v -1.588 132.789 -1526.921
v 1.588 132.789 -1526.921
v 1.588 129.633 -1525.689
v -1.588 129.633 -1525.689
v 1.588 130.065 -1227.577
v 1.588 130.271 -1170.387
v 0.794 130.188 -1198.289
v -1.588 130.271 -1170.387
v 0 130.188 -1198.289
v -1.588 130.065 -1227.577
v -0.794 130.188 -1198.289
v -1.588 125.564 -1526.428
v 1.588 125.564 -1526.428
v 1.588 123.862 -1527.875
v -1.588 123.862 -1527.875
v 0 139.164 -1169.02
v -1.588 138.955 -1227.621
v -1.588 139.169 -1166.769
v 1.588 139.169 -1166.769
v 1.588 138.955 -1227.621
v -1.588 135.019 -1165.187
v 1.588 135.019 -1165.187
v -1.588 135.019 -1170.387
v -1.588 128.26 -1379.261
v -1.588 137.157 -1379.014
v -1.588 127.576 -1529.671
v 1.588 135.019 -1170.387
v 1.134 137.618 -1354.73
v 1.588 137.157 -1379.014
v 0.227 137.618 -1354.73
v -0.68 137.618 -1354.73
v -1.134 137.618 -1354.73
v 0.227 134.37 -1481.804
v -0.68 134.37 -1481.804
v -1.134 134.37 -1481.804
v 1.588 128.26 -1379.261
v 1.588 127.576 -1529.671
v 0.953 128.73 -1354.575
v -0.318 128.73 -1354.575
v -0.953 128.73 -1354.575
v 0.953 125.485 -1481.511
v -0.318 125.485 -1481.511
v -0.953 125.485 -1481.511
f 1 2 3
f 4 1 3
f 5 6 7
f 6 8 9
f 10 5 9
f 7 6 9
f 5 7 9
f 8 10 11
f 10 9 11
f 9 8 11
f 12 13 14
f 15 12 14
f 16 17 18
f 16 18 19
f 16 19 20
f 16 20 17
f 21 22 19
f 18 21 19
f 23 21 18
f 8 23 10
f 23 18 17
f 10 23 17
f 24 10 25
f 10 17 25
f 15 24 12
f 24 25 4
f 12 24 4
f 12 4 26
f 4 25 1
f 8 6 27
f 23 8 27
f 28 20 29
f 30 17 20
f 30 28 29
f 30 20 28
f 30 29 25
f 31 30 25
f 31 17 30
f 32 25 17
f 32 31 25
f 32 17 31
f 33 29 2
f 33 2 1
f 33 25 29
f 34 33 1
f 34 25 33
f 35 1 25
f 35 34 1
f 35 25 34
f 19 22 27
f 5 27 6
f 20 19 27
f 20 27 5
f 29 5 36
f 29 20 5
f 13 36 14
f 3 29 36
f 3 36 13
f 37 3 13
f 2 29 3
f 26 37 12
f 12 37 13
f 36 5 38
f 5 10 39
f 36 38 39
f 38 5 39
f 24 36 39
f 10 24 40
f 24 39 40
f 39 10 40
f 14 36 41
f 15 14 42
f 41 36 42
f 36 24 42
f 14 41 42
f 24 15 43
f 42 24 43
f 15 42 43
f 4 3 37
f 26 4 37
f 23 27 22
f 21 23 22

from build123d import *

# Parameters (mm, degrees)
BOSS_EXTRUDE1_START = -1.5875
BOSS_EXTRUDE1_DEPTH = 3.175
FILLET1_R           = 2.54
CUT_EXTRUDE1_DEPTH  = 2674.191025632
FILLET2_R           = 0.762
FILLET3_R           = 0.762
CUT_EXTRUDE2_DEPTH  = 7.62


with BuildPart() as part:
    # Boss-Extrude1: read off the stored shape, not the designer's step
    # Boss-Extrude1 outline → Boss-Extrude1 (new body)
    with BuildSketch(Plane(origin=(0, 0, 0), x_dir=(0, 0, -1), z_dir=(1, 0, 0)).offset(BOSS_EXTRUDE1_START)):
        with BuildLine():
            add(Edge.make_bspline(
                [(1110.404970926, 130.384545774), (1120.170834465, 130.370061323), (1139.703057908, 130.338772026), (1168.998370974, 130.277673039), (1198.290610395, 130.194386876), (1217.81419633, 130.113940836), (1227.576506903, 130.06508052)],
                knots=[0, 0, 0, 0, 0.25, 0.5, 0.75, 1, 1, 1, 1], degree=3))
            add(Edge.make_bspline(
                [(1227.576506903, 130.06508052), (1269.911205773, 129.853195249), (1333.427746701, 129.273373321), (1418.042208161, 127.449050563), (1502.665994832, 124.913583682), (1608.454176987, 120.803299479), (1693.070073331, 116.848243245), (1735.369787733, 114.744712179)],
                knots=[0, 0, 0, 0, 0.25, 0.375, 0.5, 0.75, 1, 1, 1, 1], degree=3))
            add(Edge.make_bspline(
                [(1735.369787733, 114.744712179), (1815.995940723, 110.735232018), (1936.906650462, 104.096364548), (2098.049485168, 94.18797875), (2198.694736725, 87.314638509), (2279.130413747, 81.114418931), (2339.412950304, 76.034076608), (2399.564054334, 70.28270545), (2479.570468264, 61.127378254), (2559.292087872, 49.650907614), (2626.797554585, 38.235484735), (2656.889518578, 32.788503969), (2667.159793662, 30.877771266), (2669.54, 30.432069924)],
                knots=[0, 0, 0, 0, 0.25, 0.375, 0.5, 0.5625, 0.625, 0.6875, 0.75, 0.875, 0.9375, 0.96241067, 0.969928536, 0.969928536, 0.969928536, 0.969928536], degree=3))
            Line((2669.54, 30.432069924), (2669.54, 39.476142465))
            add(Edge.make_bspline(
                [(1735.811334709, 123.623740069), (1776.138635499, 121.618292624), (1816.460281579, 119.500621806), (1897.093668675, 115.087561885), (1937.405638896, 112.792971084), (2018.018419045, 108.018366523), (2058.319512223, 105.539122976), (2138.903780144, 100.307240032), (2179.18739793, 97.555127955), (2239.586998714, 93.080168687), (2259.716280977, 91.529837622), (2289.900442602, 89.09084343), (2299.960179135, 88.258845039), (2320.076004566, 86.552861654), (2330.132100898, 85.678962223), (2350.239356518, 83.874334847), (2360.290489794, 82.943307484), (2380.385973971, 81.003183297), (2390.430065378, 79.993418555), (2420.547026195, 76.827577532), (2440.60648589, 74.533672955), (2480.675569568, 69.556278523), (2500.68715183, 66.874150811), (2540.654290207, 61.150246295), (2560.611026428, 58.109755646), (2600.475457131, 51.702465574), (2620.382967089, 48.337538888), (2650.028116889, 43.072156367), (2659.78844051, 41.29687683), (2669.54, 39.476142465)],
                knots=[0, 0, 0, 0, 0.125, 0.125, 0.25, 0.25, 0.375, 0.375, 0.5, 0.5, 0.5625, 0.5625, 0.59375, 0.59375, 0.625, 0.625, 0.65625, 0.65625, 0.6875, 0.6875, 0.75, 0.75, 0.8125, 0.8125, 0.875, 0.875, 0.9375, 0.9375, 0.968210768, 0.968210768, 0.968210768, 0.968210768], degree=3))
            add(Edge.make_bspline(
                [(1227.621000751, 138.954969175), (1248.807303679, 138.848931677), (1269.993583155, 138.701170252), (1312.363832348, 138.270664618), (1333.547719008, 137.987407832), (1375.912368189, 137.249274813), (1397.09309738, 136.7925677), (1439.451328259, 135.701855835), (1460.629010312, 135.069210584), (1502.979101161, 133.670541385), (1524.152152736, 132.907434339), (1566.494303759, 131.284732459), (1587.663166024, 130.423163385), (1651.164052809, 127.709123983), (1693.490421561, 125.728325331), (1735.811334709, 123.623740069)],
                knots=[0, 0, 0, 0, 0.125, 0.125, 0.25, 0.25, 0.375, 0.375, 0.5, 0.5, 0.625, 0.625, 0.75, 0.75, 1, 1, 1, 1], degree=3))
            add(Edge.make_bspline(
                [(1110.418156307, 139.274535996), (1129.952027249, 139.245563914), (1149.485893504, 139.211997476), (1188.553558893, 139.115899087), (1208.087346834, 139.052735015), (1227.621000751, 138.954969175)],
                knots=[0, 0, 0, 0, 0.5, 0.5, 1, 1, 1, 1], degree=3))
            add(Edge.make_bspline(
                [(768.740124165, 138.468408213), (782.976796045, 138.460280143), (797.213453801, 138.479500079), (825.686695051, 138.549690296), (839.923258916, 138.600062665), (868.396318956, 138.719026333), (882.632808962, 138.789607972), (911.105746117, 138.939594729), (925.342197007, 139.018479563), (953.81517223, 139.160090703), (968.051699178, 139.222241505), (996.524919377, 139.30995407), (1010.761605517, 139.335014039), (1039.234912871, 139.349647552), (1053.471562869, 139.340493535), (1081.944860968, 139.313691902), (1096.181508981, 139.29565137), (1110.418156307, 139.274535996)],
                knots=[0, 0, 0, 0, 0.125, 0.125, 0.25, 0.25, 0.375, 0.375, 0.5, 0.5, 0.625, 0.625, 0.75, 0.75, 0.875, 0.875, 1, 1, 1, 1], degree=3))
            add(Edge.make_bspline(
                [(630.778432202, 139.251437536), (653.771819614, 139.075315664), (676.765000849, 138.871740519), (711.255349111, 138.647690701), (722.752238945, 138.586174182), (745.746099074, 138.499784896), (757.243084259, 138.474972158), (768.740124165, 138.468408213)],
                knots=[0, 0, 0, 0, 0.5, 0.5, 0.75, 0.75, 1, 1, 1, 1], degree=3))
            add(Edge.make_bspline(
                [(604.514984259, 139.433685568), (609.940743136, 139.400696354), (618.695242427, 139.342071397), (627.449694696, 139.276935028), (630.778432202, 139.251437536)],
                knots=[0, 0, 0, 0, 0.619765686, 1, 1, 1, 1], degree=3))
            ThreePointArc((604.514984259, 139.433685568), (600.549356142, 139.457173081), (596.583720644, 139.479379304))
            add(Edge.make_bspline(
                [(436.133018826, 139.357176562), (449.50393779, 139.390650739), (462.874888934, 139.412366015), (489.61665939, 139.498555977), (502.987497127, 139.559076553), (529.729299233, 139.628029754), (543.100240501, 139.639230481), (569.84212102, 139.601013959), (583.212960696, 139.552035302), (596.583720644, 139.479379304)],
                knots=[0, 0, 0, 0, 0.25, 0.25, 0.5, 0.5, 0.75, 0.75, 1, 1, 1, 1], degree=3))
            add(Edge.make_bspline(
                [(432.263917423, 139.347117104), (433.553617637, 139.350567112), (434.843318039, 139.353947814), (436.133018826, 139.357176562)],
                knots=[0, 0, 0, 0, 1, 1, 1, 1], degree=3))
            add(Edge.make_bspline(
                [(420.316232014, 139.305761868), (422.413235913, 139.315186344), (426.395793967, 139.330351666), (430.378363115, 139.342073082), (432.263917423, 139.347117104)],
                knots=[0, 0, 0, 0, 0.526548575, 1, 1, 1, 1], degree=3))
            add(Edge.make_bspline(
                [(376.410119779, 138.75403864), (383.726317086, 138.935561778), (391.043801196, 139.055611797), (405.679602634, 139.224192856), (412.997895507, 139.272871444), (420.316232014, 139.305761868)],
                knots=[0, 0, 0, 0, 0.5, 0.5, 1, 1, 1, 1], degree=3))
            add(Edge.make_bspline(
                [(336.49221538, 137.002990798), (349.782924989, 137.88646357), (363.094318653, 138.423658969), (376.410119779, 138.75403864)],
                knots=[0, 0, 0, 0, 1, 1, 1, 1], degree=3))
            add(Edge.make_bspline(
                [(322.369488076, 135.928469458), (327.073374868, 136.333386449), (331.781331813, 136.689844531), (336.49221538, 137.002990798)],
                knots=[0, 0, 0, 0, 1, 1, 1, 1], degree=3))
            add(Edge.make_bspline(
                [(269.769949315, 129.47895505), (274.123387467, 130.231879276), (278.485668028, 130.925946417), (287.22796256, 132.196043087), (291.608626646, 132.771988738), (300.381777496, 133.818422146), (304.774579419, 134.288963443), (313.567800313, 135.154375086), (317.967903853, 135.549407043), (322.369488076, 135.928469458)],
                knots=[0, 0, 0, 0, 0.25, 0.25, 0.5, 0.5, 0.75, 0.75, 1, 1, 1, 1], degree=3))
            add(Edge.make_bspline(
                [(135.15718457, 90.054634926), (146.043739673, 94.375230064), (156.99891695, 98.504335222), (173.56622243, 104.322560697), (179.110932848, 106.199810145), (190.24859245, 109.819698901), (195.841545849, 111.562316625), (207.065472514, 114.901345648), (212.697969124, 116.49836249), (224.005973618, 119.540534541), (229.683240596, 120.9862349), (246.767187276, 125.077694043), (258.225188059, 127.482295924), (269.769949315, 129.47895505)],
                knots=[0, 0, 0, 0, 0.25, 0.25, 0.375, 0.375, 0.5, 0.5, 0.625, 0.625, 0.75, 0.75, 1, 1, 1, 1], degree=3))
            add(Edge.make_bspline(
                [(107.049744533, 78.466050261), (116.373258882, 82.438606419), (125.737350123, 86.316143859), (135.15718457, 90.054634926)],
                knots=[0, 0, 0, 0, 1, 1, 1, 1], degree=3))
            add(Edge.make_bspline(
                [(99.06, 75.03568963), (99.223542669, 75.106424562), (100.635498802, 75.716852689), (103.297453866, 76.863328103), (105.798503999, 77.932922637), (107.049744533, 78.466050261)],
                knots=[0.484151133, 0.484151133, 0.484151133, 0.484151133, 0.515864471, 0.757931449, 1, 1, 1, 1], degree=3))
            Line((99.06, 75.03568963), (99.06, 65.345043949))
            add(Edge.make_bspline(
                [(99.06, 65.345043949), (99.380370965, 65.484464523), (100.637671455, 66.031176319), (103.17753745, 67.132002814), (106.681577323, 68.64166857), (109.249580285, 69.740028797), (110.534459652, 70.287489229)],
                knots=[0.254738807, 0.254738807, 0.254738807, 0.254738807, 0.317238807, 0.5, 0.75, 1, 1, 1, 1], degree=3))
            add(Edge.make_bspline(
                [(110.534459652, 70.287489229), (112.850658013, 71.274373329), (117.489277519, 73.236837099), (124.456688526, 76.138068453), (131.438476528, 78.994265342), (136.101204469, 80.864754132), (138.436571012, 81.791601309)],
                knots=[0, 0, 0, 0, 0.25, 0.5, 0.75, 1, 1, 1, 1], degree=3))
            add(Edge.make_bspline(
                [(138.436571012, 81.791601309), (143.826897197, 83.930883835), (154.6522834, 88.11877139), (176.408203186, 96.037596764), (203.906835742, 104.998187521), (237.39469787, 114.027149543), (259.934818065, 118.755998441), (271.284977744, 120.719001348)],
                knots=[0, 0, 0, 0, 0.125, 0.25, 0.5, 0.75, 1, 1, 1, 1], degree=3))
            add(Edge.make_bspline(
                [(271.284977744, 120.719001348), (275.558711595, 121.458140765), (284.124297478, 122.821139095), (297.036360548, 124.518896272), (310.018420247, 125.909880891), (318.766623126, 126.695286194), (323.13209925, 127.071239405)],
                knots=[5e-09, 5e-09, 5e-09, 5e-09, 0.2499992, 0.4999984, 0.7499976, 0.999996801, 0.999996801, 0.999996801, 0.999996801], degree=3))
            add(Edge.make_bspline(
                [(323.13209925, 127.071239405), (324.293050056, 127.171175344), (326.615168427, 127.365043892), (330.101568176, 127.638529754), (333.590184216, 127.895089457), (335.917953069, 128.055198639), (337.081858513, 128.132566852)],
                knots=[1.2024e-05, 1.2024e-05, 1.2024e-05, 1.2024e-05, 0.250009018, 0.500006012, 0.750003006, 1, 1, 1, 1], degree=3))
            add(Edge.make_bspline(
                [(337.081858513, 128.132566852), (340.367862287, 128.350997241), (346.939906877, 128.744909116), (356.821319657, 129.221190111), (366.716250393, 129.595096292), (373.326613137, 129.784797569), (376.630622597, 129.866773678)],
                knots=[0, 0, 0, 0, 0.25, 0.5, 0.75, 1, 1, 1, 1], degree=3))
            add(Edge.make_bspline(
                [(376.630622597, 129.866773678), (380.266394474, 129.956981294), (387.534764147, 130.106779908), (398.462206547, 130.259361028), (409.400972015, 130.358727994), (416.705417778, 130.39944419), (420.356185481, 130.415851648)],
                knots=[0, 0, 0, 0, 0.25, 0.5, 0.75, 1, 1, 1, 1], degree=3))
            add(Edge.make_bspline(
                [(420.356185481, 130.415851648), (421.350045129, 130.420318309), (423.337533562, 130.428603137), (426.320174328, 130.439402209), (429.303468332, 130.448883952), (431.293011648, 130.454488038), (432.287698861, 130.457148912)],
                knots=[0, 0, 0, 0, 0.25, 0.5, 0.75, 1, 1, 1, 1], degree=3))
            add(Edge.make_bspline(
                [(432.287698861, 130.457148912), (432.610032304, 130.45801117), (433.254717136, 130.45972707), (434.221637716, 130.462266911), (435.188505114, 130.464765142), (435.833012253, 130.466397641), (436.155274747, 130.46720442)],
                knots=[9.2e-08, 9.2e-08, 9.2e-08, 9.2e-08, 0.25, 0.5, 0.75, 1, 1, 1, 1], degree=3))
            add(Edge.make_bspline(
                [(436.155274747, 130.46720442), (449.528322363, 130.500683927), (476.275740382, 130.546633815), (516.38896029, 130.728798697), (556.456290895, 130.759667498), (583.176533448, 130.662101975), (596.535396133, 130.589510646)],
                knots=[0, 0, 0, 0, 0.249999973, 0.499999946, 0.749999918, 0.999999891, 0.999999891, 0.999999891, 0.999999891], degree=3))
            ThreePointArc((596.535396133, 130.589510646), (600.498158983, 130.567320504), (604.460914457, 130.543849998))
            add(Edge.make_bspline(
                [(604.460914457, 130.543849998), (606.648150431, 130.530551362), (611.022503017, 130.502867011), (617.584689429, 130.458405465), (624.147187284, 130.411339888), (628.522663802, 130.378455494), (630.7103385, 130.361698324)],
                knots=[-7.09e-07, -7.09e-07, -7.09e-07, -7.09e-07, 0.249999468, 0.499999646, 0.749999823, 1, 1, 1, 1], degree=3))
            add(Edge.make_bspline(
                [(630.7103385, 130.361698324), (642.206126489, 130.273644326), (665.193556095, 130.083785311), (699.699077953, 129.819212193), (734.21504011, 129.634735151), (757.228597075, 129.58497898), (768.735048644, 129.578409662)],
                knots=[0, 0, 0, 0, 0.25, 0.5, 0.75, 1, 1, 1, 1], degree=3))
            add(Edge.make_bspline(
                [(768.735048644, 129.578409662), (797.222409768, 129.56214552), (854.203652026, 129.725124503), (939.635195481, 130.236578518), (1024.992958464, 130.524931921), (1081.937612336, 130.426767717), (1110.404970926, 130.384545774)],
                knots=[0, 0, 0, 0, 0.25, 0.5, 0.75, 1, 1, 1, 1], degree=3))
        make_face()
    extrude(amount=BOSS_EXTRUDE1_DEPTH)

    # Fillet1
    fillet1_edges = [part.edges().sort_by_distance(p)[0] for p in [
        (0, 39.476142465, -2669.54),
        (0, 30.432069924, -2669.54),
        (0, 65.345043949, -99.06),
        (0, 75.03568963, -99.06),
    ]]
    fillet(fillet1_edges, radius=FILLET1_R)

    # Sketch4 → Cut-Extrude1 (cut, through all)
    with BuildSketch(Plane(origin=(1.5875, 0, 0), x_dir=(0, 0, -1), z_dir=(1, 0, 0))):
        Polygon((1827.2125, 118.895836595), (1827.2125, 110.000384115), (1827.2125, 78.791710134), (2135.1875, 78.791710134), (2135.1875, 91.599357392), (2135.1875, 100.508307819), (2135.1875, 129.353842083), (1827.2125, 129.353842083), align=None)
    extrude(amount=-CUT_EXTRUDE1_DEPTH, mode=Mode.SUBTRACT)


with BuildPart() as cut_extrude1_piece_1:
    # of the separate pieces the step leaves, piece 1, a body of its own (cut_extrude1_pieces)
    add(part.part.solids().sort_by_distance((-1.5875, 114.744712179, -1735.369787733))[0])

    # Fillet2
    fillet2_edges = [cut_extrude1_piece_1.edges().sort_by_distance(p)[0] for p in [
        (0, 118.895836595, -1827.2125),
        (0, 110.000384116, -1827.2125),
    ]]
    fillet(fillet2_edges, radius=FILLET2_R)


with BuildPart() as cut_extrude1_piece_2:
    # of the separate pieces the step leaves, piece 2, a body of its own (cut_extrude1_pieces)
    add(part.part.solids().sort_by_distance((-1.5875, 91.599357392, -2135.1875))[0])

    # Fillet3
    fillet3_edges = [cut_extrude1_piece_2.edges().sort_by_distance(p)[0] for p in [
        (0, 100.508307819, -2135.1875),
        (0, 91.599357392, -2135.1875),
    ]]
    fillet(fillet3_edges, radius=FILLET3_R)


with BuildPart() as cut_extrude2_tool:
    # Sketch5 → Cut-Extrude2 (new body)
    with BuildSketch(Plane(origin=(1.5875, 0, 0), x_dir=(0, 0, -1), z_dir=(1, 0, 0))):
        Polygon((1526.921002642, 132.788776067), (1525.689431031, 129.632745348), (1529.671392187, 127.575945218), (1526.428351657, 125.564439067), (1528.398437884, 123.245298517), (1528.398437884, 114.766362614), (2693.334534373, -50.097096662), (2835.169185114, 79.330013005), (1526.921002642, 139.169420645), align=None)
        Polygon((1166.769177473, 139.169420645), (1166.769177473, 145.055582544), (49.799388011, 171.247154198), (49.799388011, 0), (1170.386904229, 114.766362614), (1170.386904229, 130.270526743), (1170.386904229, 135.018963115), (1165.186656638, 135.018963115), align=None)
    extrude(amount=-CUT_EXTRUDE2_DEPTH)


with BuildPart() as cut_extrude1_piece_1_1:
    add(cut_extrude1_piece_1.part)

    # Cut-Extrude2: cut by cut_extrude2_tool
    add(cut_extrude2_tool.part, mode=Mode.SUBTRACT)


with BuildPart() as cut_extrude1_piece_2_1:
    add(cut_extrude1_piece_2.part)

    # Cut-Extrude2: cut by cut_extrude2_tool
    add(cut_extrude2_tool.part, mode=Mode.SUBTRACT)


solid = cut_extrude1_piece_1_1.part
